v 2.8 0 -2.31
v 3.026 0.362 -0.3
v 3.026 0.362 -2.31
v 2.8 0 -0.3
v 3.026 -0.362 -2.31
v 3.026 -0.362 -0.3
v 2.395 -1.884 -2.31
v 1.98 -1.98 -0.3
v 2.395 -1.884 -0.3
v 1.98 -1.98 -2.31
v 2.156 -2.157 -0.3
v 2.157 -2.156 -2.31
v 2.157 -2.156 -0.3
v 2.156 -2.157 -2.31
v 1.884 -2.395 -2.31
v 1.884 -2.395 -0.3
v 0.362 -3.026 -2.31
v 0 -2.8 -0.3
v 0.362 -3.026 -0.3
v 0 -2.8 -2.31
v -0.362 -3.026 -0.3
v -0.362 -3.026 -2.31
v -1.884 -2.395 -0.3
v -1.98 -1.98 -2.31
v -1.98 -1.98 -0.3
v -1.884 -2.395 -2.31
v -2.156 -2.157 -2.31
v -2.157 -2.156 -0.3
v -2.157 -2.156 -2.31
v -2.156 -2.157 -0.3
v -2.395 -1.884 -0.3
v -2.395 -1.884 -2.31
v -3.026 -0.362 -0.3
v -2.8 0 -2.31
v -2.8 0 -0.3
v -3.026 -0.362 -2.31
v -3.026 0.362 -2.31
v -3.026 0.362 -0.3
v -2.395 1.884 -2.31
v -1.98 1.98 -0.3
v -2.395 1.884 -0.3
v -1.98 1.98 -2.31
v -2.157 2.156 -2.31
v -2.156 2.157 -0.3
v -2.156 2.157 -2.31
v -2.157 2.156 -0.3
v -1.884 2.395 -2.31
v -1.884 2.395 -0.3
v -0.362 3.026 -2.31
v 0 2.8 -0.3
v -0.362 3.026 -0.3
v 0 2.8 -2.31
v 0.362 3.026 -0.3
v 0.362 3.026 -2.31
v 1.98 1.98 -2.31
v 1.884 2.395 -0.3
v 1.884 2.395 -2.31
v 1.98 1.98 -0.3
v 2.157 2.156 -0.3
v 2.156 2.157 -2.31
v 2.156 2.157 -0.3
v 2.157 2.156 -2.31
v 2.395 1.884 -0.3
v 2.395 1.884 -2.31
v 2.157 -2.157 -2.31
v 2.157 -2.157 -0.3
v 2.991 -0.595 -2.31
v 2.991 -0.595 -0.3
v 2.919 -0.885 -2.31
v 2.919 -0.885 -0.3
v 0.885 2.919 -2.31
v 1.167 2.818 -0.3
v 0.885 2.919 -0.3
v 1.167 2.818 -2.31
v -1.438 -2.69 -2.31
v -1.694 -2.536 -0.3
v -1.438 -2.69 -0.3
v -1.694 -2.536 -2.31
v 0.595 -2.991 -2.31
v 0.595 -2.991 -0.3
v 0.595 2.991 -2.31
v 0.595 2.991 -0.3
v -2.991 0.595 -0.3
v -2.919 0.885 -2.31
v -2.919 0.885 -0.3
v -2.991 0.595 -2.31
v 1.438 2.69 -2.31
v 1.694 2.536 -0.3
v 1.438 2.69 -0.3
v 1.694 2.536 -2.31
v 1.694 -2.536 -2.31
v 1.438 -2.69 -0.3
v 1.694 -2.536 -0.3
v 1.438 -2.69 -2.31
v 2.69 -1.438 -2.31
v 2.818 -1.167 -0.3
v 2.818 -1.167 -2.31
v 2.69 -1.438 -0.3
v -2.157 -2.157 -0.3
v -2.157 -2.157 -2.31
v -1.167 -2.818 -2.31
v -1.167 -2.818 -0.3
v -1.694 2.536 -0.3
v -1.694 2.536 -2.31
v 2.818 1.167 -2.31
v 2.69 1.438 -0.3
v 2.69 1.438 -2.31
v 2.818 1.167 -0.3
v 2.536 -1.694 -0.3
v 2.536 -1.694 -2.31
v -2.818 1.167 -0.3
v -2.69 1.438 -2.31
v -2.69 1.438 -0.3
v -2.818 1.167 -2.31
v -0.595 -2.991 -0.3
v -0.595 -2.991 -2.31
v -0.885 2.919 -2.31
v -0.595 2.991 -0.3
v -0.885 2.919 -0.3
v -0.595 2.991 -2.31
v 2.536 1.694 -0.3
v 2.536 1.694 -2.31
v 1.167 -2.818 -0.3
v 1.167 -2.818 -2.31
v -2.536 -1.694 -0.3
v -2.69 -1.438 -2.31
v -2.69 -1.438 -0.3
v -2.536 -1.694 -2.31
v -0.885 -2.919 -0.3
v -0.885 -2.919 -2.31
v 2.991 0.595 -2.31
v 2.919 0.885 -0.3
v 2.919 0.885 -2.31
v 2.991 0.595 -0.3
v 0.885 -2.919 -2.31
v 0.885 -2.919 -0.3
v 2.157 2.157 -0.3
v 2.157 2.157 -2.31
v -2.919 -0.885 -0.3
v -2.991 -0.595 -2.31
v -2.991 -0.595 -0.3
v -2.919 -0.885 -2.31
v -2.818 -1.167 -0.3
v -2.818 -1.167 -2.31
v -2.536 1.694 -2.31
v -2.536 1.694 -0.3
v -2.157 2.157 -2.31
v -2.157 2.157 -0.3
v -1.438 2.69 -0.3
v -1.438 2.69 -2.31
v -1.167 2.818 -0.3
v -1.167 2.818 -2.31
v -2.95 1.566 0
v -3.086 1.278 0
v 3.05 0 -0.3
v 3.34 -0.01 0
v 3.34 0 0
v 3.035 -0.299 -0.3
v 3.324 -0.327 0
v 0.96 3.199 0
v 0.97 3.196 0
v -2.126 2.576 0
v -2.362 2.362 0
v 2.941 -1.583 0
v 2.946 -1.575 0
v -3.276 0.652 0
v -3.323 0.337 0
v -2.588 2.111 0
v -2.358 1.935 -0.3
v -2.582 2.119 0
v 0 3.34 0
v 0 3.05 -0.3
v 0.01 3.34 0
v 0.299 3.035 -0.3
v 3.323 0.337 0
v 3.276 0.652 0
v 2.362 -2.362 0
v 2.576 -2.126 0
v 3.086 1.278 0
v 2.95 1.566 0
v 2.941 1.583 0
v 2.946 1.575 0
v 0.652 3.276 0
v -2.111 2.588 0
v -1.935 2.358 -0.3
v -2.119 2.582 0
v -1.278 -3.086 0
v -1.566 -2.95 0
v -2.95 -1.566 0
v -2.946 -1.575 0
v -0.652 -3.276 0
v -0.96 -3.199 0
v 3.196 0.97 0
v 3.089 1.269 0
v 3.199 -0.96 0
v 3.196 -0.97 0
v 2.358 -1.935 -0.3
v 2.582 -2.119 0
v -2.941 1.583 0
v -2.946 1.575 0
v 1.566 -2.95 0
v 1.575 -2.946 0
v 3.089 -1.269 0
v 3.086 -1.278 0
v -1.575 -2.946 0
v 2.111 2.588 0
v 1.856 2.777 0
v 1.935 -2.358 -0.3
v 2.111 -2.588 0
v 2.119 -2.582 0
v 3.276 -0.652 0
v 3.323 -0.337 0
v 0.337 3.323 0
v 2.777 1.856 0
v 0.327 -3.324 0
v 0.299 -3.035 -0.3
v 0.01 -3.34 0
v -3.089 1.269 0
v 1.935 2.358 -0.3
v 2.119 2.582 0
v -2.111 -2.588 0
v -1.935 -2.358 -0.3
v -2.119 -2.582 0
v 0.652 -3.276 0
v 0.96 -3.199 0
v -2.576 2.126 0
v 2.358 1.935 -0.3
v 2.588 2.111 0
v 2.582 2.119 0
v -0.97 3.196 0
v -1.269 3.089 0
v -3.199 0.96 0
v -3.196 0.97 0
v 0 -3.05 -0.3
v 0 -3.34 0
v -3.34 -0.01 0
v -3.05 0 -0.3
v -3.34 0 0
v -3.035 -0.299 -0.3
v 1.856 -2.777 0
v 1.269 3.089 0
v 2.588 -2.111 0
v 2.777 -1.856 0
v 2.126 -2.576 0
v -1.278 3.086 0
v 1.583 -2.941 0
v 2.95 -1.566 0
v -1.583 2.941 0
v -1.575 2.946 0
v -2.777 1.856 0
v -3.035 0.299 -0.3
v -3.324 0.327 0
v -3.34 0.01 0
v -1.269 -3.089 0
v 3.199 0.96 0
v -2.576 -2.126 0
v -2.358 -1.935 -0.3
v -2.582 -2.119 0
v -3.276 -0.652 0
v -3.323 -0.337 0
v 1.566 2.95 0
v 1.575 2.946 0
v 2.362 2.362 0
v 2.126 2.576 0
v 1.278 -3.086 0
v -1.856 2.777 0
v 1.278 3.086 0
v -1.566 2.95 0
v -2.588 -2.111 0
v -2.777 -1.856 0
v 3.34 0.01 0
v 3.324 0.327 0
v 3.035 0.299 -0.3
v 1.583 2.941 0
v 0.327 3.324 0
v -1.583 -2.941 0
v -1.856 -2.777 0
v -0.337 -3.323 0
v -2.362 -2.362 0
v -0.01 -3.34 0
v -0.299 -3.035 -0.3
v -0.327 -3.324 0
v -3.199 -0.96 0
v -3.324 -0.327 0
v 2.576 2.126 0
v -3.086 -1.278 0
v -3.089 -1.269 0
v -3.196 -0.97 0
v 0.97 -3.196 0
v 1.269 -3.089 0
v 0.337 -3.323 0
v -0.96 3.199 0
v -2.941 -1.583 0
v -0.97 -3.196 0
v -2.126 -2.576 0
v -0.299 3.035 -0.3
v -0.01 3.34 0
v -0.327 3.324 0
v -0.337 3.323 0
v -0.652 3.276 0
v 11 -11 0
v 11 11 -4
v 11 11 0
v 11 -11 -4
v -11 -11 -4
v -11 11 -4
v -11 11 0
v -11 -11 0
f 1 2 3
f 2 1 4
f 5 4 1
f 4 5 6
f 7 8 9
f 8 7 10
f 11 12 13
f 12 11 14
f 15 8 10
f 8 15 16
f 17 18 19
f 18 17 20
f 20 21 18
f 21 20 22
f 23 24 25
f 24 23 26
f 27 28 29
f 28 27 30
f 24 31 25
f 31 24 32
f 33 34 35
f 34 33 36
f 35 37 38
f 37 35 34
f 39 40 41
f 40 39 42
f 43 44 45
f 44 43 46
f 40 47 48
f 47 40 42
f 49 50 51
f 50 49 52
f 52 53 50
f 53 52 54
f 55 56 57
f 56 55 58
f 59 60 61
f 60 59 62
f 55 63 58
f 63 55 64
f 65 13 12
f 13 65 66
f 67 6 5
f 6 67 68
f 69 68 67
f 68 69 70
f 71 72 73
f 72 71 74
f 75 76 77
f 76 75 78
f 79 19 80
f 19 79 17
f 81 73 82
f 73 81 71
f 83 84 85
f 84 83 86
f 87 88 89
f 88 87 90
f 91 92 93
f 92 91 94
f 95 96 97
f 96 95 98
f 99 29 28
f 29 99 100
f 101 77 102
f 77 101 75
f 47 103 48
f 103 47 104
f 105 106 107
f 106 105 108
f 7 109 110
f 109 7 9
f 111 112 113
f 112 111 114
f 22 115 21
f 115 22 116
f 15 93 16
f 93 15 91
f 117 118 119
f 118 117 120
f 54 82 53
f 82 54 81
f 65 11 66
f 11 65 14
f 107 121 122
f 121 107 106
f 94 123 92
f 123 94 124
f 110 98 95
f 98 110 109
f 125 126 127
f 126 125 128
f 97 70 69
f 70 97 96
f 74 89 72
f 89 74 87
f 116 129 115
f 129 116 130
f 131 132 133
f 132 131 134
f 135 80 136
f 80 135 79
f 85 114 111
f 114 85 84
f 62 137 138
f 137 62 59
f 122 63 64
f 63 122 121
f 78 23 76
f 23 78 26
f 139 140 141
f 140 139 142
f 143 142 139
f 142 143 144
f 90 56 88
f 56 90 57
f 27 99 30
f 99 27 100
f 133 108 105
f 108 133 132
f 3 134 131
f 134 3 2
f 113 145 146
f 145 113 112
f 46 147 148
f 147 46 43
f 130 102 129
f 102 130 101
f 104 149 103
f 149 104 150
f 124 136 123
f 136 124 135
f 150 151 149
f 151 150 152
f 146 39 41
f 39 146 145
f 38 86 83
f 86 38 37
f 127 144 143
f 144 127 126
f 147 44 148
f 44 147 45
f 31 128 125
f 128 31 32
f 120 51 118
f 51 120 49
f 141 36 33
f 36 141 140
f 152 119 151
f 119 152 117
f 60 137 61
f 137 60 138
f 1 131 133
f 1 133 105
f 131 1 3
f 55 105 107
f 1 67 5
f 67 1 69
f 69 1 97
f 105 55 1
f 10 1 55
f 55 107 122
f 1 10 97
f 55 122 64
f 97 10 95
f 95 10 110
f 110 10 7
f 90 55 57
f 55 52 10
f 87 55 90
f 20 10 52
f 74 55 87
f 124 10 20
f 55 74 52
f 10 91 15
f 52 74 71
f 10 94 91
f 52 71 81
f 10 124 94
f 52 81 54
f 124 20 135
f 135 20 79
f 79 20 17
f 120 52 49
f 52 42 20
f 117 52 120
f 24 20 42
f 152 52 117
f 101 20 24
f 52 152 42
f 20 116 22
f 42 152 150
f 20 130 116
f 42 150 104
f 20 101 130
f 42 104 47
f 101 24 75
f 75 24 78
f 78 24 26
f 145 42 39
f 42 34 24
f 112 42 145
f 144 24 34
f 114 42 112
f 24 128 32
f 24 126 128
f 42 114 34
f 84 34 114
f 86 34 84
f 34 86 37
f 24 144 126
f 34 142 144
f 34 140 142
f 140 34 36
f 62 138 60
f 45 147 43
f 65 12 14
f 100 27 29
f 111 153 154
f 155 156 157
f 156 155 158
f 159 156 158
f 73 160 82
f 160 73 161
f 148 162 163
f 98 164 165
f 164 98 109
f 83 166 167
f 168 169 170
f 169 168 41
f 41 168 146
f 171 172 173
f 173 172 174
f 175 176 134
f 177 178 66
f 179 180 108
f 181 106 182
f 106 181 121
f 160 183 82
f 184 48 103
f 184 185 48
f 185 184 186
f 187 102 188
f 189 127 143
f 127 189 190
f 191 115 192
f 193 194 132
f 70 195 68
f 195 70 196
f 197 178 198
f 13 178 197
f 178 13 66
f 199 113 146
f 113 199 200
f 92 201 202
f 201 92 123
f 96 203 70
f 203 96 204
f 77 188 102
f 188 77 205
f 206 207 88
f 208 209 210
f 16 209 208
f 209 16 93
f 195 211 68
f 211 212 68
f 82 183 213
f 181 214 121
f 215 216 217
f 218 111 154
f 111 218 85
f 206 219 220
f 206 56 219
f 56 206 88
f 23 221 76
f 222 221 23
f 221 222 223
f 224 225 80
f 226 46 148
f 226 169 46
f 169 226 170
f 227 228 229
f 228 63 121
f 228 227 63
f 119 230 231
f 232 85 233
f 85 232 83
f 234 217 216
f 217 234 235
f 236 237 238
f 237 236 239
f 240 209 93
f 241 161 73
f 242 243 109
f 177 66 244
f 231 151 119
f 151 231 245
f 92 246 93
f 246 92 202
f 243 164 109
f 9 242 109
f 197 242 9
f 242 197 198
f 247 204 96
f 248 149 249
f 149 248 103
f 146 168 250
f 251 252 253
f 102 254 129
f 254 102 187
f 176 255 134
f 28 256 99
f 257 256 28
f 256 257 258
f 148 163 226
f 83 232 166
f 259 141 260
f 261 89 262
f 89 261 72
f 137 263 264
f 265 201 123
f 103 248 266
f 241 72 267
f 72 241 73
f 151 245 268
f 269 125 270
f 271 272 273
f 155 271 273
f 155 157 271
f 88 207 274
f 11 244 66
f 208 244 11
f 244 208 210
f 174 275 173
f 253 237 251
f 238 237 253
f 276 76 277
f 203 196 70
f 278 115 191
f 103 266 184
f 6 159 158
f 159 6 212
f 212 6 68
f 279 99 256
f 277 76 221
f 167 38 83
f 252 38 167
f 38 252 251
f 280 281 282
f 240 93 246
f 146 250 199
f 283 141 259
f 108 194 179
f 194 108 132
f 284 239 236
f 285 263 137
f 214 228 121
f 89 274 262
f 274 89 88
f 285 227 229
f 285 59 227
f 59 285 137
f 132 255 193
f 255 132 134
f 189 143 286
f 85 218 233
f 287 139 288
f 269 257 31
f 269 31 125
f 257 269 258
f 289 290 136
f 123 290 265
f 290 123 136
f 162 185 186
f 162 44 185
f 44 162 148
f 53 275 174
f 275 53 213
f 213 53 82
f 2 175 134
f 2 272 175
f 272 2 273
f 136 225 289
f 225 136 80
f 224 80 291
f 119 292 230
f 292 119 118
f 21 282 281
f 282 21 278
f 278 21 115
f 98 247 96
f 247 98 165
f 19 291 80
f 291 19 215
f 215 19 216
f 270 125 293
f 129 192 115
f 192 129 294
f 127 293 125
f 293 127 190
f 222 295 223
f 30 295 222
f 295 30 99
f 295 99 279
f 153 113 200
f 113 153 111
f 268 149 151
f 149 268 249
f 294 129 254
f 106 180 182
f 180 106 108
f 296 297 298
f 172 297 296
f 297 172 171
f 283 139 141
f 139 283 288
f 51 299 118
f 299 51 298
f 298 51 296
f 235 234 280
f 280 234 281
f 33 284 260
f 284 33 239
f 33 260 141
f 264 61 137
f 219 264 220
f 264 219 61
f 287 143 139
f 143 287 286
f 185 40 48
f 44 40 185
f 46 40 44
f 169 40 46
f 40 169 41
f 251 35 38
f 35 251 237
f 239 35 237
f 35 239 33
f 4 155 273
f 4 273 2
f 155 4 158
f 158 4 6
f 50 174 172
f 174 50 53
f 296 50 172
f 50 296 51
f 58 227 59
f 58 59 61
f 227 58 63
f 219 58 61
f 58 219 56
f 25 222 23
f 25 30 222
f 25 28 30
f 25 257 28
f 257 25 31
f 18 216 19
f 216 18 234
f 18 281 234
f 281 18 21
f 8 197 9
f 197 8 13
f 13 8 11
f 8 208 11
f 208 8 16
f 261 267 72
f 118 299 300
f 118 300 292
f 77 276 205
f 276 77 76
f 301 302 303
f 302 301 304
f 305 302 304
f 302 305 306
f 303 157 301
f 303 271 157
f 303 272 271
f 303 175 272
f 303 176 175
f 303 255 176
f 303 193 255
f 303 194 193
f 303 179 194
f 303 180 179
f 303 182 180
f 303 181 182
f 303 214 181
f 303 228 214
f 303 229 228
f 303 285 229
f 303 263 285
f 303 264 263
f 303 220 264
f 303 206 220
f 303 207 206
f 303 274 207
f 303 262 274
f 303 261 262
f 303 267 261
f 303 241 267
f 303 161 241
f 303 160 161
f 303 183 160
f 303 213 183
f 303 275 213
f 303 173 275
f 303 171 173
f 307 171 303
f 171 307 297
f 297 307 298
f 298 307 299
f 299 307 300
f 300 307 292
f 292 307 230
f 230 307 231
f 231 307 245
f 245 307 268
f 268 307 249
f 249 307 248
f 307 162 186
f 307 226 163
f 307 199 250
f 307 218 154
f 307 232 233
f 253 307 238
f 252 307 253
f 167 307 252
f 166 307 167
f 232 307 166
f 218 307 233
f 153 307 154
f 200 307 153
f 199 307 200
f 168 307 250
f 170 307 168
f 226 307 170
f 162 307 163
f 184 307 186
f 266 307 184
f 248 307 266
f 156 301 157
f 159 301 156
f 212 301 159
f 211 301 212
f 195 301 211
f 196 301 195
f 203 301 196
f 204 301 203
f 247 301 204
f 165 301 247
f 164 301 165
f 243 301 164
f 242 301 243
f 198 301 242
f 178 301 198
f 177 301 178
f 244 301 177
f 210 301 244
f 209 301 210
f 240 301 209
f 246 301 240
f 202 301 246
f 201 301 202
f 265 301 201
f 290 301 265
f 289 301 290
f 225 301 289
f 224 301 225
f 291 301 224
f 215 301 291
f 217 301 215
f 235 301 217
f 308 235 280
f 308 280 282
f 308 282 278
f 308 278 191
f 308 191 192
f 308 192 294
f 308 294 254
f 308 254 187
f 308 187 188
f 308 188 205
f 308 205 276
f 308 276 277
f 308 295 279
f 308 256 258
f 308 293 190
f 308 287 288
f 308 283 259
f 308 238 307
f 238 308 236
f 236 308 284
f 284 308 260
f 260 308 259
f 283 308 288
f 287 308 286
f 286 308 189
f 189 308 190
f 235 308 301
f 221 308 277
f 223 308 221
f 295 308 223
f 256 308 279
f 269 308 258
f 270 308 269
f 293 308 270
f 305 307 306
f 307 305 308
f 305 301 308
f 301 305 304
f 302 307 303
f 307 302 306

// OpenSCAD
// file: ../magnet_well.scad
// magnet_well.scad
// version: 0.2.0
// Shared disc-magnet press-fit recipes and well cutters. Product parts pass a
// named recipe so identical magnet specifications cannot drift by caller.

$fn = 64;
EPS = 0.01;

MAGNET_RECIPE_BORE_DIAMETER = 0;
MAGNET_RECIPE_RIB_TIP_DIAMETER = 1;
MAGNET_RECIPE_RIB_PROTRUSION = 2;
MAGNET_RECIPE_WELL_DEPTH = 3;
MAGNET_RECIPE_CHAMFER = 4;
MAGNET_RECIPE_RIB_COUNT = 5;
MAGNET_RECIPE_RIB_WIDTH = 6;
MAGNET_RECIPE_FIELD_COUNT = 7;

// Canonical product recipe for a 6 x 1.5mm disc magnet. The proven 0.25mm
// radial crush defines the 5.60mm rib-tip diameter from the 6.10mm bore.
// The selected 2.30mm depth remains pending physical confirmation.
function hutchfinity_magnet_recipe_6x1_5() =
    let(
        bore_diameter = 6.10,
        rib_protrusion = 0.25
    ) [
        bore_diameter,
        bore_diameter - 2 * rib_protrusion,
        rib_protrusion,
        2.30,
        0.30,
        8,
        0.80
    ];

function hutchfinity_magnet_recipe_bore_diameter(recipe) =
    recipe[MAGNET_RECIPE_BORE_DIAMETER];
function hutchfinity_magnet_recipe_rib_tip_diameter(recipe) =
    recipe[MAGNET_RECIPE_RIB_TIP_DIAMETER];
function hutchfinity_magnet_recipe_rib_protrusion(recipe) =
    recipe[MAGNET_RECIPE_RIB_PROTRUSION];
function hutchfinity_magnet_recipe_well_depth(recipe) =
    recipe[MAGNET_RECIPE_WELL_DEPTH];
function hutchfinity_magnet_recipe_chamfer(recipe) =
    recipe[MAGNET_RECIPE_CHAMFER];
function hutchfinity_magnet_recipe_rib_count(recipe) =
    recipe[MAGNET_RECIPE_RIB_COUNT];
function hutchfinity_magnet_recipe_rib_width(recipe) =
    recipe[MAGNET_RECIPE_RIB_WIDTH];

function hutchfinity_magnet_recipe_is_valid(recipe) =
    is_list(recipe) &&
    len(recipe) == MAGNET_RECIPE_FIELD_COUNT &&
    hutchfinity_magnet_recipe_bore_diameter(recipe) > 0 &&
    hutchfinity_magnet_recipe_rib_tip_diameter(recipe) > 0 &&
    hutchfinity_magnet_recipe_rib_protrusion(recipe) >= 0 &&
    abs(
        hutchfinity_magnet_recipe_bore_diameter(recipe) -
        hutchfinity_magnet_recipe_rib_tip_diameter(recipe) -
        2 * hutchfinity_magnet_recipe_rib_protrusion(recipe)
    ) <= EPS &&
    hutchfinity_magnet_recipe_well_depth(recipe) > 0 &&
    hutchfinity_magnet_recipe_chamfer(recipe) >= 0 &&
    hutchfinity_magnet_recipe_rib_count(recipe) >= 3 &&
    hutchfinity_magnet_recipe_rib_width(recipe) > 0;

module hutchfinity_magnet_well_cut(
    position,
    recipe = hutchfinity_magnet_recipe_6x1_5(),
    z = 0
) {
    bore_diameter = hutchfinity_magnet_recipe_bore_diameter(recipe);
    rib_tip_diameter = hutchfinity_magnet_recipe_rib_tip_diameter(recipe);
    rib_protrusion = hutchfinity_magnet_recipe_rib_protrusion(recipe);
    well_depth = hutchfinity_magnet_recipe_well_depth(recipe);
    well_chamfer = hutchfinity_magnet_recipe_chamfer(recipe);
    rib_count = hutchfinity_magnet_recipe_rib_count(recipe);
    rib_width = hutchfinity_magnet_recipe_rib_width(recipe);
    bore_r = bore_diameter / 2;
    tip_r = rib_tip_diameter / 2;
    chamfer = min(well_chamfer, well_depth / 2);
    rib_depth = max(EPS, well_depth - chamfer);

    assert(hutchfinity_magnet_recipe_is_valid(recipe),
        "magnet recipe must contain one consistent bore, rib, depth, chamfer, count, and width");

    translate([position[0], position[1], z - EPS])
    union() {
        cylinder(r1=bore_r + chamfer, r2=bore_r, h=chamfer + EPS);

        translate([0, 0, chamfer])
        difference() {
            cylinder(r=bore_r, h=rib_depth + 2 * EPS);

            if (rib_protrusion > EPS) {
                for (i = [0 : rib_count - 1]) {
                    rotate([0, 0, i * (360 / rib_count)])
                    linear_extrude(height=rib_depth + 3 * EPS)
                    polygon([
                        [tip_r, 0],
                        [bore_r, -rib_width / 2],
                        [bore_r, rib_width / 2]
                    ]);
                }
            }
        }
    }
}

module hutchfinity_magnet_well_cuts(
    positions,
    recipe = hutchfinity_magnet_recipe_6x1_5(),
    z = 0
) {
    for (p = positions)
        hutchfinity_magnet_well_cut(p, recipe, z);
}
// main file
// magnet_well_shape_inspection.scad
// version: 0.2.0
// Printable face coupon for the canonical 6 x 1.5mm product magnet recipe.

use <../magnet_well.scad>;

$fn = 96;

COUPON_SIZE = 22;
COUPON_THICKNESS = 4;

module visible_well_coupon(recipe = hutchfinity_magnet_recipe_6x1_5()) {
    assert(COUPON_THICKNESS > hutchfinity_magnet_recipe_well_depth(recipe),
        "coupon must retain material below the magnet well");

    rotate([180, 0, 0])
    difference() {
        translate([-COUPON_SIZE / 2, -COUPON_SIZE / 2, 0])
            cube([COUPON_SIZE, COUPON_SIZE, COUPON_THICKNESS]);
        hutchfinity_magnet_well_cut([0, 0], recipe);
    }
}

visible_well_coupon();
